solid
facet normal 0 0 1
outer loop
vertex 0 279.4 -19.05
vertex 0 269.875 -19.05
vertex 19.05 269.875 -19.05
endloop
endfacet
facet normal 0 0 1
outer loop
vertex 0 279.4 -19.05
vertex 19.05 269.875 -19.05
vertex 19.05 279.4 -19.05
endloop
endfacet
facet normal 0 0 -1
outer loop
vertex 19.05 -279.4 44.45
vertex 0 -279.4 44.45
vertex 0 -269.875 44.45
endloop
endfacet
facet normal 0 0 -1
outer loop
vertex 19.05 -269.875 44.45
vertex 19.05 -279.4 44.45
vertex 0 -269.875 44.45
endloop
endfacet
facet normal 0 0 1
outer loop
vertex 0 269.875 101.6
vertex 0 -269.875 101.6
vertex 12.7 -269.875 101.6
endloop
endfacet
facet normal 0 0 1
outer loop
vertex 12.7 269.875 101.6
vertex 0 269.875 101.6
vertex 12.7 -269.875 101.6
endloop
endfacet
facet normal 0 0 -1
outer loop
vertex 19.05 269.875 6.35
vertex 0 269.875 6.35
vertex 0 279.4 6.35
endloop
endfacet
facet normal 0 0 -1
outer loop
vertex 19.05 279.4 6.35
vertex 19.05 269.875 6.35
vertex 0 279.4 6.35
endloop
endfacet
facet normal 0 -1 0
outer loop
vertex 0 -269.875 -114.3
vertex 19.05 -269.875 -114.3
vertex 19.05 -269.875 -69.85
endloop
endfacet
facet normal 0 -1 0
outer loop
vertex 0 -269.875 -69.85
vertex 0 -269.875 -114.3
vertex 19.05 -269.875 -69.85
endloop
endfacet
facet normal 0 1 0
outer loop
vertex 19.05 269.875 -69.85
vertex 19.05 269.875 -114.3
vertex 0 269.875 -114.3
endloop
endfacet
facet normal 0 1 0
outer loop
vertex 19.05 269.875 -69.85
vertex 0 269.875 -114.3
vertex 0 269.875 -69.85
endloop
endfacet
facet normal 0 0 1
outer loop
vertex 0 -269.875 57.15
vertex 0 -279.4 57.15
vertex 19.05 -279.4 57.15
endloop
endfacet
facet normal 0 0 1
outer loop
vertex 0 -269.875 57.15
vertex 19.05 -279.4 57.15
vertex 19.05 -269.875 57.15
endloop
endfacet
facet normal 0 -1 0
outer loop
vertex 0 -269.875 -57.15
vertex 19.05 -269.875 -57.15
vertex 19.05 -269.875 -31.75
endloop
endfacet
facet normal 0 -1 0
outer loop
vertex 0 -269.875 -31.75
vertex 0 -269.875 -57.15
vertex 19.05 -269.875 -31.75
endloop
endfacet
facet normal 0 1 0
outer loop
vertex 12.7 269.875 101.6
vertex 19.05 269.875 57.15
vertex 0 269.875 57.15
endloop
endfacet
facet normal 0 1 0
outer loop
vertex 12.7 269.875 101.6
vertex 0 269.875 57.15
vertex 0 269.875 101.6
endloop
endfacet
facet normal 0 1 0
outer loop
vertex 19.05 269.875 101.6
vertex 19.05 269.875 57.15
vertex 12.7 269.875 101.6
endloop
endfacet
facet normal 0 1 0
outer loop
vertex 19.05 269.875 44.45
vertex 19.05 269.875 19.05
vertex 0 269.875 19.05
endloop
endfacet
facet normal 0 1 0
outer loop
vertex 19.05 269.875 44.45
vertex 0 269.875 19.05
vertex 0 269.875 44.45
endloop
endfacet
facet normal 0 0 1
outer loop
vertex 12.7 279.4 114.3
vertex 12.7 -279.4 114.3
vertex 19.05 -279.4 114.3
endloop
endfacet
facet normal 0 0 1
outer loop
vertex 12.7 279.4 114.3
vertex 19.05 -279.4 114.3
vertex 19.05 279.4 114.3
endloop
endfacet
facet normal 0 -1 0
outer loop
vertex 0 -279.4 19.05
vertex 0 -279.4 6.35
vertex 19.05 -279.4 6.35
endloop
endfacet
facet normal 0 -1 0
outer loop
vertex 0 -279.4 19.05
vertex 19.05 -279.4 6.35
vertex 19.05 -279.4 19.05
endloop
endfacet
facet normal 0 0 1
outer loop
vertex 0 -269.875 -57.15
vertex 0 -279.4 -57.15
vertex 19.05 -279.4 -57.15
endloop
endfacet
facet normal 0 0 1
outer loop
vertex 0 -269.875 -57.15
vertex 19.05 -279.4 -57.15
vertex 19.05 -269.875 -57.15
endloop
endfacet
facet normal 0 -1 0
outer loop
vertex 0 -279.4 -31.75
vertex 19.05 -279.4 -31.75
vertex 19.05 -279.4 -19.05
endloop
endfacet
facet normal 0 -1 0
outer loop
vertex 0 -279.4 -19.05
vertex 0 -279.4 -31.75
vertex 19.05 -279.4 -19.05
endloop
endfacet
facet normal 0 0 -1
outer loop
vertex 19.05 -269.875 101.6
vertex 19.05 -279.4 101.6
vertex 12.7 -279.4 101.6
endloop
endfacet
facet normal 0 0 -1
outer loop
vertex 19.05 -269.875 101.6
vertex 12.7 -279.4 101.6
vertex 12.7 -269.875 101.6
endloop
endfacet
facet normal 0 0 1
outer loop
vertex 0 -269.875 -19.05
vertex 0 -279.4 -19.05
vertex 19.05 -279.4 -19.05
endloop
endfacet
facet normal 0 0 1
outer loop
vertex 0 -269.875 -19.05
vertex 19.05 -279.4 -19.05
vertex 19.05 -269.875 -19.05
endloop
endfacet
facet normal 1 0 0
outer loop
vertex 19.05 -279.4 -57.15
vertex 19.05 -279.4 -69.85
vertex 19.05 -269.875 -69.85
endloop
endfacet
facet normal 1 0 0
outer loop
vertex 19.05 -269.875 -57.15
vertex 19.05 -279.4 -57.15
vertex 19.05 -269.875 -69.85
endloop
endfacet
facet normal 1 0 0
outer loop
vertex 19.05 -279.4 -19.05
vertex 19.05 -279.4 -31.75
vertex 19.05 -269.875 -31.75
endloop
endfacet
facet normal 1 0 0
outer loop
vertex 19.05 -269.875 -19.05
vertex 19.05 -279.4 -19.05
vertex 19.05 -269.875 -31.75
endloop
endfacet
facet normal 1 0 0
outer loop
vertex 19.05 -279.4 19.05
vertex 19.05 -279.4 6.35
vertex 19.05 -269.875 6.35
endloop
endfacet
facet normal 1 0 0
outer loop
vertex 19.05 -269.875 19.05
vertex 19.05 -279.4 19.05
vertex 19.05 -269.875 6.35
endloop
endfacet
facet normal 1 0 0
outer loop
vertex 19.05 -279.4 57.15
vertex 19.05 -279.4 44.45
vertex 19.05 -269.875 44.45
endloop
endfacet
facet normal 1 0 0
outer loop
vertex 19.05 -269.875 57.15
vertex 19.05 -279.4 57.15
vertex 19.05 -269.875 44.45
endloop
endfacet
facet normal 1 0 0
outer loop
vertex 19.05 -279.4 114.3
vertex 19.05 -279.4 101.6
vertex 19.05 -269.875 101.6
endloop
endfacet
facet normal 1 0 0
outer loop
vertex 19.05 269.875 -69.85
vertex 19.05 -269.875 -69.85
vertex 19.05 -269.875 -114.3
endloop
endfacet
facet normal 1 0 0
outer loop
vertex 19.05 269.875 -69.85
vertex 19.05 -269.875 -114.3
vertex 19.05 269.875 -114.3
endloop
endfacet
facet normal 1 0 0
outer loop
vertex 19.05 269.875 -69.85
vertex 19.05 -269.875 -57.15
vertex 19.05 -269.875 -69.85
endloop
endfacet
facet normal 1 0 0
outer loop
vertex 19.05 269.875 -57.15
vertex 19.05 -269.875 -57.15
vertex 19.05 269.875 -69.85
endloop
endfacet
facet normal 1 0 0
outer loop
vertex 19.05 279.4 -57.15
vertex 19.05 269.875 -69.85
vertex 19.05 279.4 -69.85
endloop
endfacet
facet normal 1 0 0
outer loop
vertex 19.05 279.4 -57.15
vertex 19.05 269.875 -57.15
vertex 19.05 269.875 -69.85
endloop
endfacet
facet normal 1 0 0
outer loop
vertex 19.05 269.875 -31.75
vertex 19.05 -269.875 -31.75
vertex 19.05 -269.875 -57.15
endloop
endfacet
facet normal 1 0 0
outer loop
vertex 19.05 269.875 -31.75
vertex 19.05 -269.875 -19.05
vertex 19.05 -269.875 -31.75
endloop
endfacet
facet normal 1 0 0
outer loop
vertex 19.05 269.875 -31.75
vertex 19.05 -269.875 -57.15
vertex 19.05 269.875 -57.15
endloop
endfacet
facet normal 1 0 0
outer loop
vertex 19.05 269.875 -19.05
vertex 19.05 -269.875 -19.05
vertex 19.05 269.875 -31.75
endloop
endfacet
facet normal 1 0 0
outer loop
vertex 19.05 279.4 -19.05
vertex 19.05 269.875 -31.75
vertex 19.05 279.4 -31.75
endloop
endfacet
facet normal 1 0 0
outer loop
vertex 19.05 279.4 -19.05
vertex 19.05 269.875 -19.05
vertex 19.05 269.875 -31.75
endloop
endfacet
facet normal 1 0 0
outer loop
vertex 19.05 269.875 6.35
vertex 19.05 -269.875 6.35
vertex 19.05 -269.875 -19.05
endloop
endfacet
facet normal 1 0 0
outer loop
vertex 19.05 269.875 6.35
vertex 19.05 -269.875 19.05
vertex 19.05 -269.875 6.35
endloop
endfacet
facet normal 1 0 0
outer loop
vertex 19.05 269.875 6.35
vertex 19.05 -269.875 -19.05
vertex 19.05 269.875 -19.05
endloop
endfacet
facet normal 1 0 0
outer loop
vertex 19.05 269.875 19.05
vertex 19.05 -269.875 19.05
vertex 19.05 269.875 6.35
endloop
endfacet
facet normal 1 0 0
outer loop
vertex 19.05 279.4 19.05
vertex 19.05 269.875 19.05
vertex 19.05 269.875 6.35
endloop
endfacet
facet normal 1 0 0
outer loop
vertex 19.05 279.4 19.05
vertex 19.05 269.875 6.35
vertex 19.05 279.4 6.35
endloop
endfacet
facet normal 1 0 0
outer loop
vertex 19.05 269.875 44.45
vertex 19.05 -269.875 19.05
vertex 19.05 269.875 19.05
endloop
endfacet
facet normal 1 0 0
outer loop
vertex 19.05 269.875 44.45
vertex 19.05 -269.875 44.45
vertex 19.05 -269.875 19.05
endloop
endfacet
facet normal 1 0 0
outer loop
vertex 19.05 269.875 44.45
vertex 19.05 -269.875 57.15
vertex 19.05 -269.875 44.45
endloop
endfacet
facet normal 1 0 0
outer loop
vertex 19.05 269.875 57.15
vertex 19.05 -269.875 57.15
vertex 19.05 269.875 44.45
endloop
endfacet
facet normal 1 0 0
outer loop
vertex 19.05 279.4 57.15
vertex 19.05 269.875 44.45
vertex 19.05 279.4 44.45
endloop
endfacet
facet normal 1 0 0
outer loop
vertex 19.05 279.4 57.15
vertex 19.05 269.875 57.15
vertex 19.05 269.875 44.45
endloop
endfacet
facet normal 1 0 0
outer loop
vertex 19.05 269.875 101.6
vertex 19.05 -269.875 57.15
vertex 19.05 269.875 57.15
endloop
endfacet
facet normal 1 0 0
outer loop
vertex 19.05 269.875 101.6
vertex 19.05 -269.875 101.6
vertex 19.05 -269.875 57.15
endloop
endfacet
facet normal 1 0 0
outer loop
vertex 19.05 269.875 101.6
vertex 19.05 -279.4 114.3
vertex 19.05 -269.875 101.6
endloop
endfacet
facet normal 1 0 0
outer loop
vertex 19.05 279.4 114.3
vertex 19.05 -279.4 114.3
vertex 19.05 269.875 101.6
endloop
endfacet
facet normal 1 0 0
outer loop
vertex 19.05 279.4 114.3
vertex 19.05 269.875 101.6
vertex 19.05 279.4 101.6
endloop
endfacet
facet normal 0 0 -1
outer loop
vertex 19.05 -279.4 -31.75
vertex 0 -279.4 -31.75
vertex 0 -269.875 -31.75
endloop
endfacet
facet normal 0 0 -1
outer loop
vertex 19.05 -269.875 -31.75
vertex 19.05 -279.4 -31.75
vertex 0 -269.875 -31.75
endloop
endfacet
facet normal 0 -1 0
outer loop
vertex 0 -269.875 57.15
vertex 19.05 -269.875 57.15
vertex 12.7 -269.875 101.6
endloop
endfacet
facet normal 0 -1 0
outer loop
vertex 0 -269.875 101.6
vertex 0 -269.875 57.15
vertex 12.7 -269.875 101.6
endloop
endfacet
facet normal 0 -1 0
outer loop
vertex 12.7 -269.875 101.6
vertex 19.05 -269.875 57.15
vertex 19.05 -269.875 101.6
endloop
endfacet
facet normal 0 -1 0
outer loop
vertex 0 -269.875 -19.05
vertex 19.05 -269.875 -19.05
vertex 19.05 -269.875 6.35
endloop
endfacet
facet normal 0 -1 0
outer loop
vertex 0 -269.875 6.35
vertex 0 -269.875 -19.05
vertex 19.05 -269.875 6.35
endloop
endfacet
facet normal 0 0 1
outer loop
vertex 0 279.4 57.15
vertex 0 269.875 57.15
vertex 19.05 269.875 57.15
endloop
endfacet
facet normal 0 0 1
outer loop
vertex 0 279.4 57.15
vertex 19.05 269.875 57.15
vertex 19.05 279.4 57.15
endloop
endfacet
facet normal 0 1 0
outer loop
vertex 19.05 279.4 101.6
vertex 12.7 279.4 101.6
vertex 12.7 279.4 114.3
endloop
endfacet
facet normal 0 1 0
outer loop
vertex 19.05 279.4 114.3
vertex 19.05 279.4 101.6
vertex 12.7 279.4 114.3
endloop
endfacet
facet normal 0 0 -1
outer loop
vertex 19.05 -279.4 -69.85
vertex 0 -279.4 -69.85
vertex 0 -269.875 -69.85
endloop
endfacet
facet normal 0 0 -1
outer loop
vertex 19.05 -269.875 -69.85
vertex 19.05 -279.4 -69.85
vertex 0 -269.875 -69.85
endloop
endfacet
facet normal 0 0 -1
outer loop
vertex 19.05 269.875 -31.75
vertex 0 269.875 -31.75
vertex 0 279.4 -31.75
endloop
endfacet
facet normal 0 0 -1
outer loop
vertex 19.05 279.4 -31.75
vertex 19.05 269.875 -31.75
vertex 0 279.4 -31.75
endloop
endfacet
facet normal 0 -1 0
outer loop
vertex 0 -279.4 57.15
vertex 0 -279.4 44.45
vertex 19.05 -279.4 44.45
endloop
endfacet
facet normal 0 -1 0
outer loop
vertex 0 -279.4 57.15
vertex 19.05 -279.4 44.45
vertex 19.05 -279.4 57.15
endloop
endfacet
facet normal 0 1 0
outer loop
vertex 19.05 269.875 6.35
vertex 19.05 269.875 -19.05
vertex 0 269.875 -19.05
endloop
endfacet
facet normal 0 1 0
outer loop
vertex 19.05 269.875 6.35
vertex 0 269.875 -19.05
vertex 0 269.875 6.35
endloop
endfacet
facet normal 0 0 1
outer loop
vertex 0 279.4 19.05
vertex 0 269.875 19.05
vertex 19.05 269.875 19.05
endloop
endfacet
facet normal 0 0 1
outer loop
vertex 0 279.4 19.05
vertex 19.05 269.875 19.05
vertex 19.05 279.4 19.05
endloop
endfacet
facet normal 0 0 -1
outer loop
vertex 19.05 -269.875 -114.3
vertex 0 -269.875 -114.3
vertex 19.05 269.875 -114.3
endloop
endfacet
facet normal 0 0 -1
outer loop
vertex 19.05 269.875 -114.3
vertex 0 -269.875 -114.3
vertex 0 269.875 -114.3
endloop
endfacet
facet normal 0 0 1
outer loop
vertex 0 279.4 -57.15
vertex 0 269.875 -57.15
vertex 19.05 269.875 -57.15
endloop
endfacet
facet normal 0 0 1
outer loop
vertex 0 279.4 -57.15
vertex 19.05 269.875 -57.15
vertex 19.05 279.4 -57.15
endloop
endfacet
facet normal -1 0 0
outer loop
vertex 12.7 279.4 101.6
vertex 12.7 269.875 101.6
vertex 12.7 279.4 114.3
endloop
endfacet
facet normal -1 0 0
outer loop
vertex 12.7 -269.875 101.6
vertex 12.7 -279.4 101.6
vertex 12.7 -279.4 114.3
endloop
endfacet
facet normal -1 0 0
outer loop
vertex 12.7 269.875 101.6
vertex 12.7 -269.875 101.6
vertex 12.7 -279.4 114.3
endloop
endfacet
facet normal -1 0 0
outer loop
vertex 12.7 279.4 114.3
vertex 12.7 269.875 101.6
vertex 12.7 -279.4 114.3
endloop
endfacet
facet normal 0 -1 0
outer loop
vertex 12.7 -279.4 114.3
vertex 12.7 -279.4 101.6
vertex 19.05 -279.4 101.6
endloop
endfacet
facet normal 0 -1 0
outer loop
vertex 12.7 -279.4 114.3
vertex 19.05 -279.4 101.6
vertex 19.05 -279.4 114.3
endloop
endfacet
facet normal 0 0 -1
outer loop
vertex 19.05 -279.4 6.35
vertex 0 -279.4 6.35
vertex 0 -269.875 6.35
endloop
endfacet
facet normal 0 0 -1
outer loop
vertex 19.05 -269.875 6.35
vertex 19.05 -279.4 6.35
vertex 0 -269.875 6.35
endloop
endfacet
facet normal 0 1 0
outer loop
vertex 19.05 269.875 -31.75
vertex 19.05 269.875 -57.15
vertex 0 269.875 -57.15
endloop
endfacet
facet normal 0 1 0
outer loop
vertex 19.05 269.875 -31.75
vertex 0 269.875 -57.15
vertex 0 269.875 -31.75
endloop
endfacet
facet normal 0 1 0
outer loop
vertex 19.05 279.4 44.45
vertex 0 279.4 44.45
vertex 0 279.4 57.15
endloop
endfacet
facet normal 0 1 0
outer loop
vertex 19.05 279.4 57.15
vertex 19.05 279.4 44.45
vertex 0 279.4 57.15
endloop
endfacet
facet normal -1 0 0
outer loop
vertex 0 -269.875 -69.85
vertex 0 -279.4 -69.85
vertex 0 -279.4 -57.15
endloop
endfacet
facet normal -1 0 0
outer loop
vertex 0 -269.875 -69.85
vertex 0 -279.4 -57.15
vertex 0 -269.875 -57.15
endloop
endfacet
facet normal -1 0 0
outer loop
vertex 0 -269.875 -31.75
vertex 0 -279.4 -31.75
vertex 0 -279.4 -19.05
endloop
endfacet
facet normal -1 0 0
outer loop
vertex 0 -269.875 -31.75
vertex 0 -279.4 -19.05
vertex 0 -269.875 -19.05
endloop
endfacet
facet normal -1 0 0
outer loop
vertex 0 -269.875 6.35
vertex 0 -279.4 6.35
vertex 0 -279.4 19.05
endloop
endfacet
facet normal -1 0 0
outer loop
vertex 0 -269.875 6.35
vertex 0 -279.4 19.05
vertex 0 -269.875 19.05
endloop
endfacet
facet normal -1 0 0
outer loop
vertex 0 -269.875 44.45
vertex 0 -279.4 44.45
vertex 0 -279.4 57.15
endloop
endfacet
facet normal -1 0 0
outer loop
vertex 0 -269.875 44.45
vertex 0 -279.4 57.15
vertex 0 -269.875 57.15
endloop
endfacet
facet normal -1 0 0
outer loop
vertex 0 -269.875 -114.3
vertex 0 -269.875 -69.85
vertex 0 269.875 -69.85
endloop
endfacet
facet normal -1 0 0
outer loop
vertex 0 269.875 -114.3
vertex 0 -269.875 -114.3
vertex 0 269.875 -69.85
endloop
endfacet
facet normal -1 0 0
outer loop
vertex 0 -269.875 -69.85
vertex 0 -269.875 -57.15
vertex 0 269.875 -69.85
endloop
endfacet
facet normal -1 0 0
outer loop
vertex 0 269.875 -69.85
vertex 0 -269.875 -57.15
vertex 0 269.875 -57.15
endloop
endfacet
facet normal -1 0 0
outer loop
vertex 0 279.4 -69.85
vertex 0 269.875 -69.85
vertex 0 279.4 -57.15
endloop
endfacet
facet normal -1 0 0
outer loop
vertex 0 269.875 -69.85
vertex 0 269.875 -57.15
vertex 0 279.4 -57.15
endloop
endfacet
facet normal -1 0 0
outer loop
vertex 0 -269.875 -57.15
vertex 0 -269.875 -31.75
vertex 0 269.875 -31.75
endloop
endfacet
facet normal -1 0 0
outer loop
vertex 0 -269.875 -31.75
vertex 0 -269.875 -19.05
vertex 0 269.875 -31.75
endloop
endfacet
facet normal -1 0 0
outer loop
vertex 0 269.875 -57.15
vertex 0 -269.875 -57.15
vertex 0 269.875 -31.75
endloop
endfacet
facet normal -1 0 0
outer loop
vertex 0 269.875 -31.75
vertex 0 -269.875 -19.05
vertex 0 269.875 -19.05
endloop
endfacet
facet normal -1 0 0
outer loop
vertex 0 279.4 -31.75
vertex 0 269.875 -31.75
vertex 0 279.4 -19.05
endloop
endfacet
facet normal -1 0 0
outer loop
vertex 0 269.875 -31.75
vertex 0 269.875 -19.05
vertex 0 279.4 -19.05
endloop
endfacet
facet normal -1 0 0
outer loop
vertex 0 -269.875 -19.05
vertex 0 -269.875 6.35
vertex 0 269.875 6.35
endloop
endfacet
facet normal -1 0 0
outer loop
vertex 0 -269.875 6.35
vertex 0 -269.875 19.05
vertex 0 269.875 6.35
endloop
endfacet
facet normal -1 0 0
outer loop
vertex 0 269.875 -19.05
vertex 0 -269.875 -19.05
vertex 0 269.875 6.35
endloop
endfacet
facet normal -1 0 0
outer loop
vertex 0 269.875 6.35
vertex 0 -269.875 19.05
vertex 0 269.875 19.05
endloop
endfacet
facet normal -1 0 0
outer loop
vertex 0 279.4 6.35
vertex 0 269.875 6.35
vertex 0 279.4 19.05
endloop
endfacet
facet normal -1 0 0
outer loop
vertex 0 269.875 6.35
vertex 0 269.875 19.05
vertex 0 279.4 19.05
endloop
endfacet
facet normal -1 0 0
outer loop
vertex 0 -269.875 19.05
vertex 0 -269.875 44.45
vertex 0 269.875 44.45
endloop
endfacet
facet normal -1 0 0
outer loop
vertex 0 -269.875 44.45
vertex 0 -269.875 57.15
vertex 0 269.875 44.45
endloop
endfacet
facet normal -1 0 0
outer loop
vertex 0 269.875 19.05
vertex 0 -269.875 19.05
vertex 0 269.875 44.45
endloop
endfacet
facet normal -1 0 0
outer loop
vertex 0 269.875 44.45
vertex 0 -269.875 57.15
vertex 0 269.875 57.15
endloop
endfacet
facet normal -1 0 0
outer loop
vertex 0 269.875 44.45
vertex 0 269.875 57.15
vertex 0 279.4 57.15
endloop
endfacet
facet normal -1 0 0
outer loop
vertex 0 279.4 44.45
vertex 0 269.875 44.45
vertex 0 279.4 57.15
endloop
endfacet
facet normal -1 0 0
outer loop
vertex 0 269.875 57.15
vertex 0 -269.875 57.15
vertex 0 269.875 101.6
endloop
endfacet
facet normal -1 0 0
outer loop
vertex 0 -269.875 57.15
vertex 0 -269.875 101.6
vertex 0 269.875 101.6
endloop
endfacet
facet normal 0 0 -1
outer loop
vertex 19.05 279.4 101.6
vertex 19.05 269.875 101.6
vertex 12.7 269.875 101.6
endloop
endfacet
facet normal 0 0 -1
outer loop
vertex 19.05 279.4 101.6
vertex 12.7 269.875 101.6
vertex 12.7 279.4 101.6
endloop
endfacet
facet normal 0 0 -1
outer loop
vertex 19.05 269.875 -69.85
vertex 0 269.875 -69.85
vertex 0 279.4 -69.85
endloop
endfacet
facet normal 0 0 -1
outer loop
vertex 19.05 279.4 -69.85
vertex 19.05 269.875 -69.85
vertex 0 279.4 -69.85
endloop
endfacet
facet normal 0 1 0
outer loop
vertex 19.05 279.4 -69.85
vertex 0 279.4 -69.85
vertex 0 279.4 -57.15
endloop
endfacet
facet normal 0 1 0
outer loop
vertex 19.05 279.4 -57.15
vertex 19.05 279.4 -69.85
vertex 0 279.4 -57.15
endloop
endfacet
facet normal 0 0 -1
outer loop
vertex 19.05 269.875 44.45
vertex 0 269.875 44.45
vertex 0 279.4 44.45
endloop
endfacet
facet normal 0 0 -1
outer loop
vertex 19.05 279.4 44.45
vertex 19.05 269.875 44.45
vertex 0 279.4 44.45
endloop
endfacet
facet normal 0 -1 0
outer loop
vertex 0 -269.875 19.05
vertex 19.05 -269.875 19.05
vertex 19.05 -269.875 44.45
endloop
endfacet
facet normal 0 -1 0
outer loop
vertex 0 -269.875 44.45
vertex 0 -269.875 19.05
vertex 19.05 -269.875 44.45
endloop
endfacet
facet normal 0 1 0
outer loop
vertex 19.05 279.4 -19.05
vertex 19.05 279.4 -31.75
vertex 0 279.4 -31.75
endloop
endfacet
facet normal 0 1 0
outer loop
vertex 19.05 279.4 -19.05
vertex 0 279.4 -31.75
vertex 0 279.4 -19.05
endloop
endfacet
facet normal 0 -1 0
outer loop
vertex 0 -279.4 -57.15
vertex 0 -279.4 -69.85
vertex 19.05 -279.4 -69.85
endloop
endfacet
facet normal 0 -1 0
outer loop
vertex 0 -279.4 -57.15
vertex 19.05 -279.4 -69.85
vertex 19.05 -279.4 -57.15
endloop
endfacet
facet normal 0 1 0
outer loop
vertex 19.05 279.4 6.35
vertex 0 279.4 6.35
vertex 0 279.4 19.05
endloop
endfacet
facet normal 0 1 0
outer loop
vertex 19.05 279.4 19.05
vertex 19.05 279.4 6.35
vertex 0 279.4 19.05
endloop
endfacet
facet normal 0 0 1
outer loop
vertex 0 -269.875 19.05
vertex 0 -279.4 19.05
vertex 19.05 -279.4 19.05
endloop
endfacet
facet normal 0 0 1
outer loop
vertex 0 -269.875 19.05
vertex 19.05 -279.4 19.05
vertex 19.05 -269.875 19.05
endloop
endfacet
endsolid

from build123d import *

# Parameters (mm, degrees)
F0_W     = 558.8
F0_H     = 228.6
F1_DEPTH = 19.05
F2_W     = 12.7
F2_H     = 12.7
F3_DEPTH = 558.8
F4_W     = 9.525
F4_H     = 44.45
F4_H_2   = 25.4
F5_DEPTH = 19.05


with BuildPart() as f1:
    # F0 (on Right) → F1 (new body)
    with BuildSketch(Plane.YZ):
        Rectangle(F0_W, F0_H)
    extrude(amount=F1_DEPTH)

    # F2 (on face) → F3 (cut, through all)
    with BuildSketch(Plane.XZ.offset(279.4)):
        with Locations((6.35, 107.95)):
            Rectangle(F2_W, F2_H)
    extrude(amount=-F3_DEPTH, mode=Mode.SUBTRACT)

    # F4 (on face) → F5 (cut, through all)
    with BuildSketch(Plane.YZ.offset(19.05)):
        with Locations((-274.6375, 79.375)):
            Rectangle(F4_W, F4_H)
        with Locations((-274.6375, 31.75)):
            Rectangle(F4_W, F4_H_2)
        with Locations((-274.6375, -6.35)):
            Rectangle(F4_W, F4_H_2)
        with Locations((-274.6375, -44.45)):
            Rectangle(F4_W, F4_H_2)
        with Locations((-274.6375, -92.075)):
            Rectangle(F4_W, F4_H)
        with Locations((274.6375, 79.375)):
            Rectangle(F4_W, F4_H)
        with Locations((274.6375, 31.75)):
            Rectangle(F4_W, F4_H_2)
        with Locations((274.6375, -6.35)):
            Rectangle(F4_W, F4_H_2)
        with Locations((274.6375, -44.45)):
            Rectangle(F4_W, F4_H_2)
        with Locations((274.6375, -92.075)):
            Rectangle(F4_W, F4_H)
    extrude(amount=-F5_DEPTH, mode=Mode.SUBTRACT)


solid = f1.part
